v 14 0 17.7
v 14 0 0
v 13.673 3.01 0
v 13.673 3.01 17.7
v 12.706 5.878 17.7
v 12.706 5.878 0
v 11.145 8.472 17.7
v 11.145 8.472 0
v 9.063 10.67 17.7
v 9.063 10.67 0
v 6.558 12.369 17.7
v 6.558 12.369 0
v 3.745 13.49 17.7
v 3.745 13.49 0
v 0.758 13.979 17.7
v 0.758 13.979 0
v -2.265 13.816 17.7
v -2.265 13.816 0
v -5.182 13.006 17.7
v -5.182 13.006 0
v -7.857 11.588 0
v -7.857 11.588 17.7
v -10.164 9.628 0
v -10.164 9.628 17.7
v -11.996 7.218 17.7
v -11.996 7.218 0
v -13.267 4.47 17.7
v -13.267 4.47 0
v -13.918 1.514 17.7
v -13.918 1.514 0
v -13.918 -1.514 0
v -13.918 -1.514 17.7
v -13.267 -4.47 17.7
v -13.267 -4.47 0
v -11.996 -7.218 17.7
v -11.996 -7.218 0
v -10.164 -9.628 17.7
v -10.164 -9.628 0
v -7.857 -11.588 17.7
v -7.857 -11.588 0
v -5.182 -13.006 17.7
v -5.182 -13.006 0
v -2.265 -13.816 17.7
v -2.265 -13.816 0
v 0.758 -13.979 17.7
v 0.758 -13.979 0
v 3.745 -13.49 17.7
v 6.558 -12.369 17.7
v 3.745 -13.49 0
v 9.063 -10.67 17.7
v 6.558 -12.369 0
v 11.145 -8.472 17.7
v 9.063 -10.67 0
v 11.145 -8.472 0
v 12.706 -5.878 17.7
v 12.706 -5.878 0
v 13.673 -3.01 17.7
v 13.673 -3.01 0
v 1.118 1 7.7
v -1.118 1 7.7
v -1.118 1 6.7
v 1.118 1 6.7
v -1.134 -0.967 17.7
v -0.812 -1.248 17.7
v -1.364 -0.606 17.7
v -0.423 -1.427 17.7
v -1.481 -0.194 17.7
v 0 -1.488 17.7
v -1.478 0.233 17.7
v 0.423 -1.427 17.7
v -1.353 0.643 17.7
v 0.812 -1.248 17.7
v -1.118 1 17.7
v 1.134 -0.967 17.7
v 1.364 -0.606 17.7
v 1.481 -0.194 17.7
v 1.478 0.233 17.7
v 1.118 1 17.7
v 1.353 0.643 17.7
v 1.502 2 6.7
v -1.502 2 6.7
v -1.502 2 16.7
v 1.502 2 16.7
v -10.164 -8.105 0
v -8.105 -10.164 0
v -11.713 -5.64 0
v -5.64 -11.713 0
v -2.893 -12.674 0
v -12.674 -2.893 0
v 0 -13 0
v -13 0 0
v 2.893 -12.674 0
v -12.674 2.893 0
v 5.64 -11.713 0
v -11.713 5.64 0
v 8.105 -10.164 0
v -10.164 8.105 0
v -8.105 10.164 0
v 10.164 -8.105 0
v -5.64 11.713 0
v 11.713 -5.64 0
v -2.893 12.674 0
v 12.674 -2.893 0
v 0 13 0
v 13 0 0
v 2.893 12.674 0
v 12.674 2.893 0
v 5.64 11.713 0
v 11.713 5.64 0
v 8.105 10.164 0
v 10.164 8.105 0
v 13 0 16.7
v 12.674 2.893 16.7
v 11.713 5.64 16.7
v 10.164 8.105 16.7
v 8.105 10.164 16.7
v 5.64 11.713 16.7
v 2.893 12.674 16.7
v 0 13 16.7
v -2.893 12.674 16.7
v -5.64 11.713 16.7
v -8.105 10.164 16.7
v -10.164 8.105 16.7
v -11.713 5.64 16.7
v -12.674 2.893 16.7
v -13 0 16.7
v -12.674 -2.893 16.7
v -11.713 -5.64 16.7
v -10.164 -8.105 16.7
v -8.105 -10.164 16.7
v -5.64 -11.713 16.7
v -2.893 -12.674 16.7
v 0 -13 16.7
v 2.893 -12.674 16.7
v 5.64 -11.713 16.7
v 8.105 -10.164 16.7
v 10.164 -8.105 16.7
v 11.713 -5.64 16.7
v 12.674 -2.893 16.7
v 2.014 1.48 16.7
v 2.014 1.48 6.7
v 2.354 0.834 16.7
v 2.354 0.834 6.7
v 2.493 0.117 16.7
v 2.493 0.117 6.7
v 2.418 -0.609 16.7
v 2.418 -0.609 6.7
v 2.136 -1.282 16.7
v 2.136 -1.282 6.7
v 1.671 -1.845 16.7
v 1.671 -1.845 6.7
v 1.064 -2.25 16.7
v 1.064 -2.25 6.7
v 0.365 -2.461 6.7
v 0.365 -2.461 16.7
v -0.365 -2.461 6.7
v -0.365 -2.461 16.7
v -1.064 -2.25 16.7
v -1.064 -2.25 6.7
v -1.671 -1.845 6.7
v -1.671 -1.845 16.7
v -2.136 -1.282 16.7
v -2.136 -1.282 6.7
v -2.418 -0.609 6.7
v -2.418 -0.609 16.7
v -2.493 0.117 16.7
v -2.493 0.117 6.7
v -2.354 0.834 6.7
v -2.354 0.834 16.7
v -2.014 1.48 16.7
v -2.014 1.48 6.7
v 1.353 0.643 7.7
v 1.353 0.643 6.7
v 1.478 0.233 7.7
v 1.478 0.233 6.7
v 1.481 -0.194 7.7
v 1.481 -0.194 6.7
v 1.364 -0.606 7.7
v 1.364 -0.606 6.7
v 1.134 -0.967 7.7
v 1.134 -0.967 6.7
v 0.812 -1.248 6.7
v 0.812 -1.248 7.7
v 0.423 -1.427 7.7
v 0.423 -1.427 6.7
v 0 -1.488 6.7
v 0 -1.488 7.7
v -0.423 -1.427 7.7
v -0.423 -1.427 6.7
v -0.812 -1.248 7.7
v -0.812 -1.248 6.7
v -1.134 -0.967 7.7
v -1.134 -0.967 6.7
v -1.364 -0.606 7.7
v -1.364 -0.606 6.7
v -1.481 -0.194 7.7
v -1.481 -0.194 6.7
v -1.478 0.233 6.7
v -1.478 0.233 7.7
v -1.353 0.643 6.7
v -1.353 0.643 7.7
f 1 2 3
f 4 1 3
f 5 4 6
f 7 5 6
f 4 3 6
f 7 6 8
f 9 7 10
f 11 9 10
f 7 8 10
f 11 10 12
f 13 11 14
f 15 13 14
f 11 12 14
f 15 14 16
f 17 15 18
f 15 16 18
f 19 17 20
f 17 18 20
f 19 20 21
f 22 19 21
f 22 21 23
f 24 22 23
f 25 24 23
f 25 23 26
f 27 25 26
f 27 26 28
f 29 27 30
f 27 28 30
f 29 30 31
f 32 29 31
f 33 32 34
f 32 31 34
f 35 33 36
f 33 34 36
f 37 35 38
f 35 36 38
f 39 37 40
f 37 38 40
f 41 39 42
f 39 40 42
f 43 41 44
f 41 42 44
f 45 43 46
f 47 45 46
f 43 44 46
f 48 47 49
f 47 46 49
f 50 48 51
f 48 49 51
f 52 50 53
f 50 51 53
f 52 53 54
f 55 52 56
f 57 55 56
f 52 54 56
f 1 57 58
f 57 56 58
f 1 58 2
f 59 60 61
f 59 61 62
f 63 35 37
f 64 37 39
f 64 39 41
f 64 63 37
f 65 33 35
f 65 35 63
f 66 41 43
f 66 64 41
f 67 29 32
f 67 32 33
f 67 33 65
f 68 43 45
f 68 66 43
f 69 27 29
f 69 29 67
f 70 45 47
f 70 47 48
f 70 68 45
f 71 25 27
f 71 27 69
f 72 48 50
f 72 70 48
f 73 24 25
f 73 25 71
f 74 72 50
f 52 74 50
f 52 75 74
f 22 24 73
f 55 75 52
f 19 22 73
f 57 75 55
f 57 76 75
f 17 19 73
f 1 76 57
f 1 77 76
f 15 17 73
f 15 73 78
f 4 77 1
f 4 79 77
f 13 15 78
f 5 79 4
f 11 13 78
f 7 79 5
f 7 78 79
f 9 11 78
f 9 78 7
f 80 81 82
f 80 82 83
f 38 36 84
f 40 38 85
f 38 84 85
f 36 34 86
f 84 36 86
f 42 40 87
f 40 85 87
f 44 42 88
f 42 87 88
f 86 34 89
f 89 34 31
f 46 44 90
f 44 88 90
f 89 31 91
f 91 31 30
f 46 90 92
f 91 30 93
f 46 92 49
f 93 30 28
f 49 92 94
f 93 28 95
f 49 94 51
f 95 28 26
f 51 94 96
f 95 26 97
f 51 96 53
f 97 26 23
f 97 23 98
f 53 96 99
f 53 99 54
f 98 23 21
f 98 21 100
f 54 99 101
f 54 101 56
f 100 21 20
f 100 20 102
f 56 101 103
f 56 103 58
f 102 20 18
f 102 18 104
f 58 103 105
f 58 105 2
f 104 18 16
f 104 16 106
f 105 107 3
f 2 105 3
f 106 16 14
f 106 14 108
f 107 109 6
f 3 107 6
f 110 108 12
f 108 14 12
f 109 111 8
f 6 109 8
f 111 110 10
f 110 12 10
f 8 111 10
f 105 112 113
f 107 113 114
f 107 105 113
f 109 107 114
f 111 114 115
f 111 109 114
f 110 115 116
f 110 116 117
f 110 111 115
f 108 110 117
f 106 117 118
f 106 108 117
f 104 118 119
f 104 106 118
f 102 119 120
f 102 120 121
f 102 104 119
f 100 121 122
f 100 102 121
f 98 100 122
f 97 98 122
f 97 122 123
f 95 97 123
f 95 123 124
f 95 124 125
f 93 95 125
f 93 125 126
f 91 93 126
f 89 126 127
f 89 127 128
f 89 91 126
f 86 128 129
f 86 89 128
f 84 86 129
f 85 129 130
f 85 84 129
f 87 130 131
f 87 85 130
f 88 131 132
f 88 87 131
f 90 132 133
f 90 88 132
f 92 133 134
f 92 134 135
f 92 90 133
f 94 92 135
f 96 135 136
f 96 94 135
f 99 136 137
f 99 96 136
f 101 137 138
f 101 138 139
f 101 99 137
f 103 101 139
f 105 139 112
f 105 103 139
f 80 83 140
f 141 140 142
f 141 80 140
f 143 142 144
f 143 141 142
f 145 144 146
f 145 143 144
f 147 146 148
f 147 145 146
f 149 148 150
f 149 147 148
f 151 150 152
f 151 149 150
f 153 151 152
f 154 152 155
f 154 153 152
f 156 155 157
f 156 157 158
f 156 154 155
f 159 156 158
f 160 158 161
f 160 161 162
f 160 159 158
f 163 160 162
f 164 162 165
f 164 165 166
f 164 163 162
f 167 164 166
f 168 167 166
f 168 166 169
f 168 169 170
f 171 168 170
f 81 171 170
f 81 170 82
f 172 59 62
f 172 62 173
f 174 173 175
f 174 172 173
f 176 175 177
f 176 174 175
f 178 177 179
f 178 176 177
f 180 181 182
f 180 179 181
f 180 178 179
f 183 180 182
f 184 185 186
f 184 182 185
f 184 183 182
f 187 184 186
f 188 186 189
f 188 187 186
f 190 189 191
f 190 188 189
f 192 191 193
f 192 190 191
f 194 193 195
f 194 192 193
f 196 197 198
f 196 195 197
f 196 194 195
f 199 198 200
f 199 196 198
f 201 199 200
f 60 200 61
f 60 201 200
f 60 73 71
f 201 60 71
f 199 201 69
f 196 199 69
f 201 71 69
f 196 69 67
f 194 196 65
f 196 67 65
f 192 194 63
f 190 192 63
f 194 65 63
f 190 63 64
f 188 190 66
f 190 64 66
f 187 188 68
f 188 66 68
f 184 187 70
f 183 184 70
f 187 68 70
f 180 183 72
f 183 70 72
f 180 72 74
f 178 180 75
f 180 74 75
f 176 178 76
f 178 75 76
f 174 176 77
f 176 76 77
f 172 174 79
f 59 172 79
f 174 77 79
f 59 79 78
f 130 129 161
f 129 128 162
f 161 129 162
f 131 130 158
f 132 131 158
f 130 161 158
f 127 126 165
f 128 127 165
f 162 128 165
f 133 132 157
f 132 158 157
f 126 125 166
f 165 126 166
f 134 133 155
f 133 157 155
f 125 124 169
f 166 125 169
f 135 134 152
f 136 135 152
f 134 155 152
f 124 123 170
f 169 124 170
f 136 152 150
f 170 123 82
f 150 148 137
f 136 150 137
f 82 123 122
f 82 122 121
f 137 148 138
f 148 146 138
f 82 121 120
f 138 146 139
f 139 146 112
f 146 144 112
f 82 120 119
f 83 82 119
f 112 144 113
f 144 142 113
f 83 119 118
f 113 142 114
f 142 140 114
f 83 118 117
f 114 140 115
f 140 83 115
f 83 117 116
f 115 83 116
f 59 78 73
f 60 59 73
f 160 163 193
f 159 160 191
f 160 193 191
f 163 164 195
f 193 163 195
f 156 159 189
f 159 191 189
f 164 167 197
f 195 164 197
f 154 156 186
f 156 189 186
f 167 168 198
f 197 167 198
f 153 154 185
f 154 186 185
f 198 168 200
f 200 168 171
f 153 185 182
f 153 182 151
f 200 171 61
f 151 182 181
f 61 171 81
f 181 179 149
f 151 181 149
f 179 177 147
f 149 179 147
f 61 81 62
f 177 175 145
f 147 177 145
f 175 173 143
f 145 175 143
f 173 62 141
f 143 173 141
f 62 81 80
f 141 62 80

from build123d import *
from build123d.topology import SkipClean

# Parameters (mm, degrees)
CROQUIS2_R              = 14
SALIENTE_EXTRUIR1_DEPTH = 17.7
CORTAR_EXTRUIR1_DEPTH   = 10
VACIADO4_OUTLINE_R      = 13
VACIADO4_DEPTH          = 16.7
VACIADO4_2_DEPTH        = 6.7
CORTAR_EXTRUIR5_DEPTH   = 10


# Read off the part's stored shape, not the designer's step: Vaciado4
with BuildPart() as part:
    # Croquis2 → Saliente-Extruir1 (new body)
    with BuildSketch(Plane.XY):
        Circle(CROQUIS2_R)
    extrude(amount=SALIENTE_EXTRUIR1_DEPTH)

    # Croquis3 → Cortar-Extruir1 (cut)
    with BuildSketch(Plane.XY.offset(17.7)):
        with BuildLine():
            Line((1.118033989, 1), (-1.118033989, 1))
            ThreePointArc((-1.118033989, 1), (0, -1.48785271), (1.118033989, 1))
        make_face()
    extrude(amount=-CORTAR_EXTRUIR1_DEPTH, mode=Mode.SUBTRACT)

    # Vaciado4 outline → Vaciado4 (cut)
    with BuildSketch(Plane.XY):
        Circle(VACIADO4_OUTLINE_R)
        with BuildLine():
            ThreePointArc((1.501626665, 2), (0, -2.48785271), (-1.501626665, 2))
            Line((-1.501626665, 2), (1.501626665, 2))
        make_face(mode=Mode.SUBTRACT)
    extrude(amount=VACIADO4_DEPTH, mode=Mode.SUBTRACT)

    # Vaciado4 2 outline → Vaciado4 2 (cut)
    with BuildSketch(Plane.XY):
        with BuildLine():
            Line((1.501626665, 2), (-1.501626665, 2))
            ThreePointArc((-1.501626665, 2), (0, -2.48785271), (1.501626665, 2))
        make_face()
    extrude(amount=VACIADO4_2_DEPTH, mode=Mode.SUBTRACT)

    # Croquis5 → Cortar-Extruir5 (cut)
    with SkipClean():  # the faces are left unmerged after this step: merging them gives an invalid solid
        with BuildSketch(Plane.XY.offset(7.7)):
            with BuildLine():
                Line((-1.118033989, 1), (1.118033989, 1))
                ThreePointArc((1.118033989, 1), (0, -1.48785271), (-1.118033989, 1))
            make_face()
        extrude(amount=-CORTAR_EXTRUIR5_DEPTH, mode=Mode.SUBTRACT)


solid = part.part
